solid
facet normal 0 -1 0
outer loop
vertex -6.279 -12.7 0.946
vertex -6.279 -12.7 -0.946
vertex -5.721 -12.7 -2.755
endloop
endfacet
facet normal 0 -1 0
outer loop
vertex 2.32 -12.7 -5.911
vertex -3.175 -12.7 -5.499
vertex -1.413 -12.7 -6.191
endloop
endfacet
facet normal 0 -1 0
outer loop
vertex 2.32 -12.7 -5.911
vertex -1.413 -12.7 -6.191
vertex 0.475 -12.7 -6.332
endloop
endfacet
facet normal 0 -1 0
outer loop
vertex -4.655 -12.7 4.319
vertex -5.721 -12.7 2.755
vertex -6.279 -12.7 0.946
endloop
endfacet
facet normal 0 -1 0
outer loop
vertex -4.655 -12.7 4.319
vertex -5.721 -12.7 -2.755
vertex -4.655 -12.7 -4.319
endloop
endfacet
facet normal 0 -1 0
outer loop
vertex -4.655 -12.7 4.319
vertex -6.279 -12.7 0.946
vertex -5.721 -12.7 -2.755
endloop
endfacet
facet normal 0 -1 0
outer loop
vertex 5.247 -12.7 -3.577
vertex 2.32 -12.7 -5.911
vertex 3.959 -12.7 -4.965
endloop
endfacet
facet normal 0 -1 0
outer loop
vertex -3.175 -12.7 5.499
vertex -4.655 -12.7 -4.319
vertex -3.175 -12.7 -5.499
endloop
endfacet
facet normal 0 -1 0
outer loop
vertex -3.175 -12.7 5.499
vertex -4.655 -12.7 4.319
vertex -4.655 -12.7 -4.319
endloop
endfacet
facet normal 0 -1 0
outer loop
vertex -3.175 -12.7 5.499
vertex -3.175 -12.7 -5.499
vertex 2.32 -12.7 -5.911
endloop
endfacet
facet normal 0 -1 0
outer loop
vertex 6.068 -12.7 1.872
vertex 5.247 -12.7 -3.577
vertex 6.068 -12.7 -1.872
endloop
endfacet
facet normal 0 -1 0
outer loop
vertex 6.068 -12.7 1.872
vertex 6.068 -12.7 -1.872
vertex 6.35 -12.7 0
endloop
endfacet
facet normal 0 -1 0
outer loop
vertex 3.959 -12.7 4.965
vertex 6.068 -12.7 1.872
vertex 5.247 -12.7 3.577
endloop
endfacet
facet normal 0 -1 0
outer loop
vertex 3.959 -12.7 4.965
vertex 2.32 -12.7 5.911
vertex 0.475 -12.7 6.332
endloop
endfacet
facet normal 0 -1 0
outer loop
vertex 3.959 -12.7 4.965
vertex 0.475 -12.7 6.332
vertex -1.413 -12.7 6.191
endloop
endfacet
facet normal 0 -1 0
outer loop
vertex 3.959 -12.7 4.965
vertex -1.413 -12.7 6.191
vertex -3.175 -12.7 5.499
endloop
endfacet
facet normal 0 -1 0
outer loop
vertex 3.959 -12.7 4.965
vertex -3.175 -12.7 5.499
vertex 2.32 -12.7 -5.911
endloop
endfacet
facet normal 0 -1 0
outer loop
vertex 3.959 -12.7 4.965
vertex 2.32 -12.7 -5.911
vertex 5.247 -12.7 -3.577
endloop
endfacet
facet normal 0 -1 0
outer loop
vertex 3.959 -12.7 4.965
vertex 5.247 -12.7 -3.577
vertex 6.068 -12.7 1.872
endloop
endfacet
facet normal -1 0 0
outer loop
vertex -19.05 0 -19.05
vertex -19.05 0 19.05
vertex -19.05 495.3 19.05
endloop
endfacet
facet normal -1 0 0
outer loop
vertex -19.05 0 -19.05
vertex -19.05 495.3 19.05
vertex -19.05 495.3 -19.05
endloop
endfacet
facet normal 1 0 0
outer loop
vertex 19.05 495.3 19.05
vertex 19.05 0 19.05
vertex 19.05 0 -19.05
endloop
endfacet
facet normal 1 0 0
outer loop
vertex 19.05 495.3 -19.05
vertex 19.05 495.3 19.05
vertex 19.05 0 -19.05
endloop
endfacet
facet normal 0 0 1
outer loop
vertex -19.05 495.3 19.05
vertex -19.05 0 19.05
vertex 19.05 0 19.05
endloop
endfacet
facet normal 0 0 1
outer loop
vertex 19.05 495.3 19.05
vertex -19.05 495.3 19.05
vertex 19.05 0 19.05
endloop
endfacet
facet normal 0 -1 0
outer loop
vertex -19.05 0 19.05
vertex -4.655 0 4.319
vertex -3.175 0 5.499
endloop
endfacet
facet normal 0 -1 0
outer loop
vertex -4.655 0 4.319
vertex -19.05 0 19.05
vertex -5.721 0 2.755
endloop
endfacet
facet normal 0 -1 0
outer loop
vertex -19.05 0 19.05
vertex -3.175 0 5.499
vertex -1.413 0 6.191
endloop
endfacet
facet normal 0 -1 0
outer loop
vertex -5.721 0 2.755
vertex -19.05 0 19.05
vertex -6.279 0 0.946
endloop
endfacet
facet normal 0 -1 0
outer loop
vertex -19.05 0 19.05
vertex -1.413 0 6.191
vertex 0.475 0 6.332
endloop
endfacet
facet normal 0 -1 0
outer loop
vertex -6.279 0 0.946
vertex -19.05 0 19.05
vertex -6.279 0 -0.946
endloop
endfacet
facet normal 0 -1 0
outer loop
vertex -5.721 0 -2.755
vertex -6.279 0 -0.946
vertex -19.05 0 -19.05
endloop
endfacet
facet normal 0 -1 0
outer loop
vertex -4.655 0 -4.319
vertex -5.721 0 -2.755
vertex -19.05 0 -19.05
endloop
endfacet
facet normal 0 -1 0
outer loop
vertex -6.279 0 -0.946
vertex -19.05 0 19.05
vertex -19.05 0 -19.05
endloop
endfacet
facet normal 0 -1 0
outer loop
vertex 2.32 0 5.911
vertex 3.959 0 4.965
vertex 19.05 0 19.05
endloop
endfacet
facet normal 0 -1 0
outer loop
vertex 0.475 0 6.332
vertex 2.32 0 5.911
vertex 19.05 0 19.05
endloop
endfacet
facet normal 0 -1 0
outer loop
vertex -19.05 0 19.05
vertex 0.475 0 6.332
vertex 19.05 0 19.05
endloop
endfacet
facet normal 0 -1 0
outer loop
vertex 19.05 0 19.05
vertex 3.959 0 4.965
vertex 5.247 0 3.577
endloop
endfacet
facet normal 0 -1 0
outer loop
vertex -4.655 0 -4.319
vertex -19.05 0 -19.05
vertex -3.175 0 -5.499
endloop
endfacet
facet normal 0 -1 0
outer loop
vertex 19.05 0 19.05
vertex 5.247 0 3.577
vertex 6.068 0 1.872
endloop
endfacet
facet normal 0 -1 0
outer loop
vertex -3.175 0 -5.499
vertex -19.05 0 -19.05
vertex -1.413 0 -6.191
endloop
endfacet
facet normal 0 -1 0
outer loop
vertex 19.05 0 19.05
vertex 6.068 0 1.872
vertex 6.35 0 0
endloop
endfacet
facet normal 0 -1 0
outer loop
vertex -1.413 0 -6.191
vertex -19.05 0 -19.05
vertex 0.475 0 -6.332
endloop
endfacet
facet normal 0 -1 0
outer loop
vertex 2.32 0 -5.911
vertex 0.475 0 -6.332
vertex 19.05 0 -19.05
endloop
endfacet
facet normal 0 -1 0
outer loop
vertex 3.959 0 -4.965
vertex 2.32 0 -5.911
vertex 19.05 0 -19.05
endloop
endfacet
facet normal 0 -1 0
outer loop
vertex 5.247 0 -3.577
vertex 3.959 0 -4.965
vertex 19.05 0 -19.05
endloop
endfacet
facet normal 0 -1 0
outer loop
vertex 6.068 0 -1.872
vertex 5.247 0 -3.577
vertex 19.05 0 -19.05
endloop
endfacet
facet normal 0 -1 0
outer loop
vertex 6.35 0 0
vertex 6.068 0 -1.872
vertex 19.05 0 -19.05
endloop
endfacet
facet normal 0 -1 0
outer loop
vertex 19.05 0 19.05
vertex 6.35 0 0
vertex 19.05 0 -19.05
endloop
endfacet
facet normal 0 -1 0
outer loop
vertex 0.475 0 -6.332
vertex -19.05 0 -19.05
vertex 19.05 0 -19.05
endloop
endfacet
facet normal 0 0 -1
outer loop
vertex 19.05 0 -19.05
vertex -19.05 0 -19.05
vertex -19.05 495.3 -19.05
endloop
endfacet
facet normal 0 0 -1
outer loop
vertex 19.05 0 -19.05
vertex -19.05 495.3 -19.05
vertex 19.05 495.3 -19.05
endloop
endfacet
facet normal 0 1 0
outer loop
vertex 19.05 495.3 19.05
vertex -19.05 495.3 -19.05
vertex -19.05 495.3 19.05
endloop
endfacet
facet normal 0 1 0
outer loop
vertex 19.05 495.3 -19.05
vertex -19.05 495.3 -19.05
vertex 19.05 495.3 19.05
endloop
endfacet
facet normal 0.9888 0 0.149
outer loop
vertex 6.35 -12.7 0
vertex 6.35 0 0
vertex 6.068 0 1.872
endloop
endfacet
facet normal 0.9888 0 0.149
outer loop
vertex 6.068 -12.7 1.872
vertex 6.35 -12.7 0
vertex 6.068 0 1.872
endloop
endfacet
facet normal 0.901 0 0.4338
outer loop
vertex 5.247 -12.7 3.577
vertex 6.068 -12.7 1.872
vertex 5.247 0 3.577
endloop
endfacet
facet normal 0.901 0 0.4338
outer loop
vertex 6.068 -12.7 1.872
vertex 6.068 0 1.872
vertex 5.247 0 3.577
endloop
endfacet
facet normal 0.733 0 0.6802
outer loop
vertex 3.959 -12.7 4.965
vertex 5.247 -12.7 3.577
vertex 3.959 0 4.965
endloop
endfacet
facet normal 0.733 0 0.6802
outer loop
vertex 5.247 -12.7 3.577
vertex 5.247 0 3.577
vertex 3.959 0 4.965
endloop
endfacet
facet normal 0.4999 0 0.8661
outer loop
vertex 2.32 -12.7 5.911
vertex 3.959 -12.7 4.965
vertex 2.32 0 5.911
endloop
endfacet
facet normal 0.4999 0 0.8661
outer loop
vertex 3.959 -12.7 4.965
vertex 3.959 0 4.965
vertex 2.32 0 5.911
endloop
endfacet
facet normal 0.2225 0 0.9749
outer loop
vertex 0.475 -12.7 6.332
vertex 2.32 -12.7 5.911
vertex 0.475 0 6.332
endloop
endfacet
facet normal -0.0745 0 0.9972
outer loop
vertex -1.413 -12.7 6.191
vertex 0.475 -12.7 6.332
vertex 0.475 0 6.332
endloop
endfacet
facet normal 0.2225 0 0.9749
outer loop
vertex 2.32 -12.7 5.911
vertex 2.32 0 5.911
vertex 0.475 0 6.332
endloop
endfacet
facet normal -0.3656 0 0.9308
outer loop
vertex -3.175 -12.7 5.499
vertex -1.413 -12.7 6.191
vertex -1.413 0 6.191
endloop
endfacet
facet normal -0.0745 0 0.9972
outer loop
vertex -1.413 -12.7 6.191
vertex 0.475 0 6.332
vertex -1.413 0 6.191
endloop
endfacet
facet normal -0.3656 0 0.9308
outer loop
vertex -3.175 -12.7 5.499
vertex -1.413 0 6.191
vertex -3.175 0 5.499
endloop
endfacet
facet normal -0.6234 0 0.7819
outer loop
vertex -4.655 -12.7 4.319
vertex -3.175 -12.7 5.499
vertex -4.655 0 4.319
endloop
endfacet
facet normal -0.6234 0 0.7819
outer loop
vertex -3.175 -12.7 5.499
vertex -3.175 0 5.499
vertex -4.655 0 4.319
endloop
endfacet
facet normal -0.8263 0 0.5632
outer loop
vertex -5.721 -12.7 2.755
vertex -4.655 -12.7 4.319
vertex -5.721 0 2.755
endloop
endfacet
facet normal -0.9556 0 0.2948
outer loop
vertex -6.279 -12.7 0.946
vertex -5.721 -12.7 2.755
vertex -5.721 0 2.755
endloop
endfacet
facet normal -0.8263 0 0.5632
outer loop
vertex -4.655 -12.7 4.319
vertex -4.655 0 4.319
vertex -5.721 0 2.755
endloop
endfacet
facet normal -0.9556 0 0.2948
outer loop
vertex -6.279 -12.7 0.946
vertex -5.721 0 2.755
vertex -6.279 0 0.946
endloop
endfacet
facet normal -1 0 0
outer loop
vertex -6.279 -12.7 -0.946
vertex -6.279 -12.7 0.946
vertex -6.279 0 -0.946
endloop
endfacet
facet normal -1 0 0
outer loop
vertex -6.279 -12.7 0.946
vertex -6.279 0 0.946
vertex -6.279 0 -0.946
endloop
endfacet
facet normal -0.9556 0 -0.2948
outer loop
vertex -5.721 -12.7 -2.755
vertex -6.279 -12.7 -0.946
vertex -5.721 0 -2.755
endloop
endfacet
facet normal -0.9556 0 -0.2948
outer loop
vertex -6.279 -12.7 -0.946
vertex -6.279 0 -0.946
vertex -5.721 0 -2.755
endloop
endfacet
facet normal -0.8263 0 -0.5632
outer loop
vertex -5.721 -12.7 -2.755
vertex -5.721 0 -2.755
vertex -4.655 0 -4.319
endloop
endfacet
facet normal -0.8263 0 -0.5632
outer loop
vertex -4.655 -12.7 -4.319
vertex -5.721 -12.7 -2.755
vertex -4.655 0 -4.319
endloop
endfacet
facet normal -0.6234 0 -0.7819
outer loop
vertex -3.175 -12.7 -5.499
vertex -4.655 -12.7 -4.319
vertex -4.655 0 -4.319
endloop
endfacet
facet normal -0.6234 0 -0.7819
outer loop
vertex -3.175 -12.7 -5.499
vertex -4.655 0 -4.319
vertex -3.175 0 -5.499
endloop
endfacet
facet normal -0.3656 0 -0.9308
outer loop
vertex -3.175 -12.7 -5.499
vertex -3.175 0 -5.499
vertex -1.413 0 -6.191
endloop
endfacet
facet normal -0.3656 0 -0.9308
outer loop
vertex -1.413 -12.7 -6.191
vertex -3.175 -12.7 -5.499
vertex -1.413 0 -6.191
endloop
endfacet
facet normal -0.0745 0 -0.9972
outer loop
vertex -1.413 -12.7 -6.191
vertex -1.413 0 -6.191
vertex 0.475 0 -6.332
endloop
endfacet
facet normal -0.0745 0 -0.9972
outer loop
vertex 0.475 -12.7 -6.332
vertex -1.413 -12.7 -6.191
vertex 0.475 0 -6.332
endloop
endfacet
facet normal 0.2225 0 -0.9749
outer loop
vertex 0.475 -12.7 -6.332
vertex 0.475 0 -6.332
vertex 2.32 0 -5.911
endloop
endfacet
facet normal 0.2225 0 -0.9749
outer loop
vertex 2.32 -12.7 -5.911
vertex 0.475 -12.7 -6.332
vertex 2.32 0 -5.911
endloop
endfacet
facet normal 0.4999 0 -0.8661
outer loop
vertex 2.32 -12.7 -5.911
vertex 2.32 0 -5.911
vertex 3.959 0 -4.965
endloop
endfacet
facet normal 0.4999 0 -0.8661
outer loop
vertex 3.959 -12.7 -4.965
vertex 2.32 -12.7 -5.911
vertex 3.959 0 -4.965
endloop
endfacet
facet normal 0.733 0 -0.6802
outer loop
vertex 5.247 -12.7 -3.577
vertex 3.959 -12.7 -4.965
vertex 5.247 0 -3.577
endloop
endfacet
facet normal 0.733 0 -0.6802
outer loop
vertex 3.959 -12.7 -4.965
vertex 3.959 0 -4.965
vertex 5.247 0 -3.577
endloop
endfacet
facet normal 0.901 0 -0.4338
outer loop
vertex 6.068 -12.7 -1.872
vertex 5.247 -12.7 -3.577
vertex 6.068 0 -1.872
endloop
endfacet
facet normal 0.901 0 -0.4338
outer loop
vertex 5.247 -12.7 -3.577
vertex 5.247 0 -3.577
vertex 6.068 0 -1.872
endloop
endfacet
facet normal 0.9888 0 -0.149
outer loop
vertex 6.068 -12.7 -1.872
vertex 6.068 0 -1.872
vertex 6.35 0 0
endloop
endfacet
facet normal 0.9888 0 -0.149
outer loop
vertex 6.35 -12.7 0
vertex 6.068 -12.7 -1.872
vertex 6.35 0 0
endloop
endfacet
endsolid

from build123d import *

# Parameters (mm, degrees)
CROQUIS1_W              = 38.1
CROQUIS1_H              = 38.1
SALIENTE_EXTRUIR1_DEPTH = 495.3
CROQUIS2_R              = 6.35
SALIENTE_EXTRUIR2_DEPTH = 12.7


with BuildPart() as part:
    # Croquis1 → Saliente-Extruir1 (new body)
    with BuildSketch(Plane(origin=(0, 0, 0), x_dir=(1, 0, 0), z_dir=(0, 1, 0))):
        Rectangle(CROQUIS1_W, CROQUIS1_H)
    extrude(amount=SALIENTE_EXTRUIR1_DEPTH)

    # Croquis2 → Saliente-Extruir2 (add)
    with BuildSketch(Plane.XZ):
        Circle(CROQUIS2_R)
    extrude(amount=SALIENTE_EXTRUIR2_DEPTH)


solid = part.part
